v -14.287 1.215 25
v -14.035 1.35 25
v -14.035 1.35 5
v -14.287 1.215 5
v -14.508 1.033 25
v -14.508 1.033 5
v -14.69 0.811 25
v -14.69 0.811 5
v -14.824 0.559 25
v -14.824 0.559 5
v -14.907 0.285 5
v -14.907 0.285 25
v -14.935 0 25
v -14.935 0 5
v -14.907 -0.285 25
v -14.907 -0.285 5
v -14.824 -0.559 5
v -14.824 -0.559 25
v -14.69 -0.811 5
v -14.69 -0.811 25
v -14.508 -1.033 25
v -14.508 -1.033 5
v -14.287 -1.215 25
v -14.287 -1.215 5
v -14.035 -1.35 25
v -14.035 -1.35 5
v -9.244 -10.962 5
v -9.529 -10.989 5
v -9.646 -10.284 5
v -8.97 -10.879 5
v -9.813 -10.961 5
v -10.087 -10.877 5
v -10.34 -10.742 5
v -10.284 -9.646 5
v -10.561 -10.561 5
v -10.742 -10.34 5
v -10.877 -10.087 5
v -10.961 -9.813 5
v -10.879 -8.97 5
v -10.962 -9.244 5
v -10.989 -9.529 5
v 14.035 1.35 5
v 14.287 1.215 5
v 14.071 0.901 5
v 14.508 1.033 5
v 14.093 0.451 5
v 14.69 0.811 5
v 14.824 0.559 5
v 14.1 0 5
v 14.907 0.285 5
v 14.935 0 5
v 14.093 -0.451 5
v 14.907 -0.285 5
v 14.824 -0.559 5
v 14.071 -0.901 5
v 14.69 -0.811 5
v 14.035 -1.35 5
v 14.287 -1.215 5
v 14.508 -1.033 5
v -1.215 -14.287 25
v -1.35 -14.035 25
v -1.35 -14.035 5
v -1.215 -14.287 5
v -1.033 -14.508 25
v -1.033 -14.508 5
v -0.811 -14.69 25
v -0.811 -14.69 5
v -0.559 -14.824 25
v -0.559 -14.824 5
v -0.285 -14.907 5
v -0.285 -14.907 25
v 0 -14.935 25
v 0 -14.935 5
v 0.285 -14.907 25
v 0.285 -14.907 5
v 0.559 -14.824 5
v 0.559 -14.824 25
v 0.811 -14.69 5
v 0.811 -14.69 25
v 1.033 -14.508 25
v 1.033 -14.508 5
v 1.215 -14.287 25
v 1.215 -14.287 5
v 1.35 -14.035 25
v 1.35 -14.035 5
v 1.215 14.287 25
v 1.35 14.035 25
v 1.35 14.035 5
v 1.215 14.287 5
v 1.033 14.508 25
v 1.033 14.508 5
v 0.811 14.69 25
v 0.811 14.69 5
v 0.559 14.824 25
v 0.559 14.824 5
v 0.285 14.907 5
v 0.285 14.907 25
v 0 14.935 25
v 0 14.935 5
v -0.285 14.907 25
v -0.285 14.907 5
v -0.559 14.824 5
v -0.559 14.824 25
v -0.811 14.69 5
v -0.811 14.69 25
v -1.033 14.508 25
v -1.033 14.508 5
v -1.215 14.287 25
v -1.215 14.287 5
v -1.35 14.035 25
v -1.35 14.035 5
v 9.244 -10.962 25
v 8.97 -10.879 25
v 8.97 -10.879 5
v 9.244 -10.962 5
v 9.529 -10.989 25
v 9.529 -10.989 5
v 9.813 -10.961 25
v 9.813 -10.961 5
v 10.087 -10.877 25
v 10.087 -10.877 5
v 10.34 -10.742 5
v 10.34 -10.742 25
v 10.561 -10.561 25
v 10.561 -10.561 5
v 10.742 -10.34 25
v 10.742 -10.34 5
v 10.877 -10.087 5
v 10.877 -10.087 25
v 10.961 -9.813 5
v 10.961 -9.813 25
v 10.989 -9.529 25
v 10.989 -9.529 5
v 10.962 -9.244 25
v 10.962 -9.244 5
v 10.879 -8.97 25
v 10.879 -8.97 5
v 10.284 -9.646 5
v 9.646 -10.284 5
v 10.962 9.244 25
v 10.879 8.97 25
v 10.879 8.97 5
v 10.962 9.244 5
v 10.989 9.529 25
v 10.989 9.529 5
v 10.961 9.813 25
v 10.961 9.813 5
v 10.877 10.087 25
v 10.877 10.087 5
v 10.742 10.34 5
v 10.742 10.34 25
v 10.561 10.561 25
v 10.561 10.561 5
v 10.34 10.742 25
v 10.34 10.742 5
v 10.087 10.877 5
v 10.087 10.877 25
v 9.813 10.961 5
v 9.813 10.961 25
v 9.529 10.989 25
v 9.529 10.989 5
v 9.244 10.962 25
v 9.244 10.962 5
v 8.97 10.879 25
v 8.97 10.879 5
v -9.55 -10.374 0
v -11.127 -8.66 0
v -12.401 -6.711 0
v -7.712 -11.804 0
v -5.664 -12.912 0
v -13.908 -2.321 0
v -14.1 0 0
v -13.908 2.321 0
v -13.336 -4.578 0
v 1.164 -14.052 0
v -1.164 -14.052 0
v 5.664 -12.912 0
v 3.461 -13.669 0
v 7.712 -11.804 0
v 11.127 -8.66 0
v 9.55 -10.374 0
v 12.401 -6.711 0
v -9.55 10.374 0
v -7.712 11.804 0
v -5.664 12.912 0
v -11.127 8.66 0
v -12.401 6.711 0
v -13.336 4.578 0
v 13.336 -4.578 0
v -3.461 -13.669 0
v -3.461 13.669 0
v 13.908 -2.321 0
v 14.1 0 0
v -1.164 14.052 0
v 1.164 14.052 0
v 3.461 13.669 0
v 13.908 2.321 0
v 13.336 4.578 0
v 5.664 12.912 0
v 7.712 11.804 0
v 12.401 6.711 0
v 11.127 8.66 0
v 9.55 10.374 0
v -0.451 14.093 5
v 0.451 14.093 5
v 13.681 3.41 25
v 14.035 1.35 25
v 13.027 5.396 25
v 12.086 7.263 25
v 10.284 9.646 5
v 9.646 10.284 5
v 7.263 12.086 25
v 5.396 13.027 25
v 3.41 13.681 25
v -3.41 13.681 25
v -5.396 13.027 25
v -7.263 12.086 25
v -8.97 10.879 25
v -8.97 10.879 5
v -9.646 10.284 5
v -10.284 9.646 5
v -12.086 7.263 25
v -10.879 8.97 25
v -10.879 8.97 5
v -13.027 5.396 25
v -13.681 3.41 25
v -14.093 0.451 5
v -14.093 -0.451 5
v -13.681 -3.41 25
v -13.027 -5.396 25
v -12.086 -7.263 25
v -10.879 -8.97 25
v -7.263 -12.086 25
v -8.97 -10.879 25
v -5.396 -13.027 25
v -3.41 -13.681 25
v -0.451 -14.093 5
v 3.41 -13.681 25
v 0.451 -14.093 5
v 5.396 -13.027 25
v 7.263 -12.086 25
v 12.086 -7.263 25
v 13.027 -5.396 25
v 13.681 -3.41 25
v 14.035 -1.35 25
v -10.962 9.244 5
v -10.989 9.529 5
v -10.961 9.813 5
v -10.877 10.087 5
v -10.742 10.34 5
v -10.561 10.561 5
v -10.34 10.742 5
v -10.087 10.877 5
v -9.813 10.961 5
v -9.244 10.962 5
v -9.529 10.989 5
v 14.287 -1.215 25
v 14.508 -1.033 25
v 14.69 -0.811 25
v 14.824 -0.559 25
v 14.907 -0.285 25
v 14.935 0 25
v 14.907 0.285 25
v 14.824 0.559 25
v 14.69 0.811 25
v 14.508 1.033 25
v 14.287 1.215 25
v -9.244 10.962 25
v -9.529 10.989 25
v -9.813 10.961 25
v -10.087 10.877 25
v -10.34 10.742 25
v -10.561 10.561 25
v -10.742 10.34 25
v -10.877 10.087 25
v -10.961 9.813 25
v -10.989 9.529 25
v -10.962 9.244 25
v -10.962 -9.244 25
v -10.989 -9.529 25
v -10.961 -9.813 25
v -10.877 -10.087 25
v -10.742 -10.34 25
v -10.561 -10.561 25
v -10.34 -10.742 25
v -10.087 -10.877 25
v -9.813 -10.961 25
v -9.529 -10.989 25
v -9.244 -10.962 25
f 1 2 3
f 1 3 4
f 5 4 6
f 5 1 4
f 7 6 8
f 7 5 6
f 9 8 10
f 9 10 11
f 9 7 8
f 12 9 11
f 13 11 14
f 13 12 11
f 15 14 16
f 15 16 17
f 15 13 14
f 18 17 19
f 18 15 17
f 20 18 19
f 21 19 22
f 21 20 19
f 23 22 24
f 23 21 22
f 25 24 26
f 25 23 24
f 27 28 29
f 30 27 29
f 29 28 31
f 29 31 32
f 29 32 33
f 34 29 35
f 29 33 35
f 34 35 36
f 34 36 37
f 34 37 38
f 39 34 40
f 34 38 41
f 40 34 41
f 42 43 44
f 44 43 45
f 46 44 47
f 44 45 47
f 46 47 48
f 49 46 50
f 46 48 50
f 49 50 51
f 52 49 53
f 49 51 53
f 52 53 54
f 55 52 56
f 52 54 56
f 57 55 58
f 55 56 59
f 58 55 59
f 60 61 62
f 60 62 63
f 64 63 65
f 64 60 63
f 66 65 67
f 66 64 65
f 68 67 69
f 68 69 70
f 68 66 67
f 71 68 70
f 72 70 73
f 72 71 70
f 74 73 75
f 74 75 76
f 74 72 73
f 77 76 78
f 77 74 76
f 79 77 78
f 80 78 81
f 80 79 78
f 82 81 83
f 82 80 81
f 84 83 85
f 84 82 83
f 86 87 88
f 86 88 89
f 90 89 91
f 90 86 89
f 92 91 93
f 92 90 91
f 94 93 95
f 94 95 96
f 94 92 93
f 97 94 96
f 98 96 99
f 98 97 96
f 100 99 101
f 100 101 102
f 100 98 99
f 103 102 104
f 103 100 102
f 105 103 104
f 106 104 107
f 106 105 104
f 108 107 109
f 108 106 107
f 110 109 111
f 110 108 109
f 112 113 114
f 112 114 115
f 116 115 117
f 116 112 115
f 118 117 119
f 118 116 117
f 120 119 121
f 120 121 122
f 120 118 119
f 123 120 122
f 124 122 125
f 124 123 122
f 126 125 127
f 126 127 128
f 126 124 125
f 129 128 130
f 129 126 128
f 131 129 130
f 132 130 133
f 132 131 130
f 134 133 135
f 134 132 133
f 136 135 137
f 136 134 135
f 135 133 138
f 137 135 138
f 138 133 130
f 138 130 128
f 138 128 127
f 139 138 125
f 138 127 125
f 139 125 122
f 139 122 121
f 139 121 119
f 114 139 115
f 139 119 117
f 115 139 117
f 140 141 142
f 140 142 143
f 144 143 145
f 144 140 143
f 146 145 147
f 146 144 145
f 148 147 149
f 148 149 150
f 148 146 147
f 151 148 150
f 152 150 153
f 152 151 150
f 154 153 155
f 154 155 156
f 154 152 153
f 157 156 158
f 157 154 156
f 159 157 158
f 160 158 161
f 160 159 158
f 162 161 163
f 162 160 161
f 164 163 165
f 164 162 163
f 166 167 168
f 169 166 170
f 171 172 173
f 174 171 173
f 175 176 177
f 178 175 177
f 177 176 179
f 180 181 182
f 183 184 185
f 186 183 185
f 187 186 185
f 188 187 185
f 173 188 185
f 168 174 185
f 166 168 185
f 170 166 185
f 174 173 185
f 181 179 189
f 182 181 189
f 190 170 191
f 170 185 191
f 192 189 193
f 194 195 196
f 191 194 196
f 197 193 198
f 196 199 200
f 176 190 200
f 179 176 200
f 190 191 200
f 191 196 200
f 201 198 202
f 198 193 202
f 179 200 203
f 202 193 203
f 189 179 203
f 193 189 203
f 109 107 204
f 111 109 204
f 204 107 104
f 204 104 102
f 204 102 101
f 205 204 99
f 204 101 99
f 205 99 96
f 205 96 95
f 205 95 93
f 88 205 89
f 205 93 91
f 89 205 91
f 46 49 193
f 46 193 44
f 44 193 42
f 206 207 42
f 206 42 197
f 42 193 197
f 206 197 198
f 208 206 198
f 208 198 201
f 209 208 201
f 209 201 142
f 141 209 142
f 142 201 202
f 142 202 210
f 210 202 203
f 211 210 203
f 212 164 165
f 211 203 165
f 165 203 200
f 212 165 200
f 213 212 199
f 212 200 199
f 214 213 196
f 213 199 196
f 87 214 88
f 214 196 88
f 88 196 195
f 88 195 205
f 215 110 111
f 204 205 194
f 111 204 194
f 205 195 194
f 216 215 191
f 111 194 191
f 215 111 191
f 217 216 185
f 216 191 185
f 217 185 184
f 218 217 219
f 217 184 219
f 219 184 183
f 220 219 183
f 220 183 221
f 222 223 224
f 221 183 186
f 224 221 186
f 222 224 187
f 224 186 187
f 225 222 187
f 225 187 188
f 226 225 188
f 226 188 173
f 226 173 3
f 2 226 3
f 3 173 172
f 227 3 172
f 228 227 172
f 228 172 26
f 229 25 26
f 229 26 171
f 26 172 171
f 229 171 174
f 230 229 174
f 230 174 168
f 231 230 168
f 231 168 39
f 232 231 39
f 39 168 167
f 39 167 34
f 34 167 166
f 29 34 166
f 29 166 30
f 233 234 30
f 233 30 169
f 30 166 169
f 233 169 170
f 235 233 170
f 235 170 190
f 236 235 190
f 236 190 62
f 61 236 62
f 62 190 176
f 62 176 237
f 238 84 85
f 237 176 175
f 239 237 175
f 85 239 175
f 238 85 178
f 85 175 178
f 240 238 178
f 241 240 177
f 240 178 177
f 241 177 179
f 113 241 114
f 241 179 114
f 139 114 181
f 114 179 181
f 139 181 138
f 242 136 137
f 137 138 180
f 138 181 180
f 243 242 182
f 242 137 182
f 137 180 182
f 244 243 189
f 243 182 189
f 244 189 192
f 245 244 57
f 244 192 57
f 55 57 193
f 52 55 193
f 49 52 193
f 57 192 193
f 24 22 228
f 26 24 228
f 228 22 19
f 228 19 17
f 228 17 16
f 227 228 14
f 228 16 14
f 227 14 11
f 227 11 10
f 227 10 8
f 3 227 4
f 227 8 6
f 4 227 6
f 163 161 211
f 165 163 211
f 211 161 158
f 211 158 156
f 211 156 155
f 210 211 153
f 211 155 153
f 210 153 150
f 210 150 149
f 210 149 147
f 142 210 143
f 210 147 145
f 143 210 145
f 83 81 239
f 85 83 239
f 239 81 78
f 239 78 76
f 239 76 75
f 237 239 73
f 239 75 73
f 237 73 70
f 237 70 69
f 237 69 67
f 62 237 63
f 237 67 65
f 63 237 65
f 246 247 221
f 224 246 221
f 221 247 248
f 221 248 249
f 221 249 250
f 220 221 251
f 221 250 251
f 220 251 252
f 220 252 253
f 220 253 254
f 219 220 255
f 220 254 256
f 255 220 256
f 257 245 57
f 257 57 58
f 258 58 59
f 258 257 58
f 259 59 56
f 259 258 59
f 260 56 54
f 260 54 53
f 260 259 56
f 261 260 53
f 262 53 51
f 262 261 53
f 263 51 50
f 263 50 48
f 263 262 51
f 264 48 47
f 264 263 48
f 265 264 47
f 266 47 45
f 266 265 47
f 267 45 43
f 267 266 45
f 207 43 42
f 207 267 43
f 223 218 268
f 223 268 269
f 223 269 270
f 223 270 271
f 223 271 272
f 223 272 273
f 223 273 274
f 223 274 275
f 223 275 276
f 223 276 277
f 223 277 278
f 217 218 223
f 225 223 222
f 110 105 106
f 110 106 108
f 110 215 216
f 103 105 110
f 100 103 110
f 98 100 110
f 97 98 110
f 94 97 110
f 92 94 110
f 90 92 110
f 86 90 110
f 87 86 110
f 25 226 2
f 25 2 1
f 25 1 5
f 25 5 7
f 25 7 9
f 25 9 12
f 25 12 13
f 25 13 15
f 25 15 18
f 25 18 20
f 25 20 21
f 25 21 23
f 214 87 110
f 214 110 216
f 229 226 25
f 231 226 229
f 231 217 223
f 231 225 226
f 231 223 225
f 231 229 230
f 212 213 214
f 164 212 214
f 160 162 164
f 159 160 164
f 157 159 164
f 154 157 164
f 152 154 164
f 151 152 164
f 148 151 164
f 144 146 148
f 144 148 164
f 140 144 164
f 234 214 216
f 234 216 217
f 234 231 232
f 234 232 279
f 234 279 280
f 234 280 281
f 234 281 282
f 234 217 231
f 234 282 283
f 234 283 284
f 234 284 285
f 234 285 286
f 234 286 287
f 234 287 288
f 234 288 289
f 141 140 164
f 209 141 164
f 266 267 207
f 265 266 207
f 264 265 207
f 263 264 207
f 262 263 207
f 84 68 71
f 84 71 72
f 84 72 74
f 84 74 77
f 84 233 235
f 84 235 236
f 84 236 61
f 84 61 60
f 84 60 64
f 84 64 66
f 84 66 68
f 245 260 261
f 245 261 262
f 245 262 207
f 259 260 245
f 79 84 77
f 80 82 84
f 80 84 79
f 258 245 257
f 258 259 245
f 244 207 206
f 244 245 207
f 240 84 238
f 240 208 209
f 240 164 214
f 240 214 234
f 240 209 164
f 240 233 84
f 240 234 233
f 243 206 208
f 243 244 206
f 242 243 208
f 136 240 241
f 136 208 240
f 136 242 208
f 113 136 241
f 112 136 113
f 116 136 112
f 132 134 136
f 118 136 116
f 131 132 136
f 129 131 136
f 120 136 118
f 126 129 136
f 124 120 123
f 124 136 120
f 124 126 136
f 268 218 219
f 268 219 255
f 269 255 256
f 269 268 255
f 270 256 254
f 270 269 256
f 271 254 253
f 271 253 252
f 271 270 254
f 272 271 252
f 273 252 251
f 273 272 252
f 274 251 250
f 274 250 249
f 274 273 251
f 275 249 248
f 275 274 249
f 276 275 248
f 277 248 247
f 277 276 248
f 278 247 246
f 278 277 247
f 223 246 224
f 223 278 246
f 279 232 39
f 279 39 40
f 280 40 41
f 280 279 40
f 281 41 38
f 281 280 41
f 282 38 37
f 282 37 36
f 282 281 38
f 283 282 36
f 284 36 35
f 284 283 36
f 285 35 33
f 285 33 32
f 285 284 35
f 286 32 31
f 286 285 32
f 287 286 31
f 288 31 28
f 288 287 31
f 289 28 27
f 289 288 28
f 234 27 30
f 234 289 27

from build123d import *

# Parameters (mm, degrees)
CYLINDER_R         = 14.1
CYLINDER_DEPTH     = 25
PAD_DEPTH          = 20
POLARPATTERN_COUNT = 8


with BuildPart() as part:
    # Cylinder → Cylinder (join)
    with BuildSketch(Plane.XY):
        Circle(CYLINDER_R)
    extrude(amount=CYLINDER_DEPTH)

    # Sketch001 (on Face2 of Cylinder) → Pad (join)
    with BuildSketch(Plane.XY.offset(25)):
        with BuildLine():
            ThreePointArc((1.35, 14.0352235465), (0, 14.9352235465), (-1.35, 14.0352235465))
            ThreePointArc((1.35, 14.0352235465), (0, 14.1), (-1.35, 14.0352235465))
        make_face()
    pad = extrude(amount=-PAD_DEPTH)

    # PolarPattern: Pad ×8 about axis
    polarpattern_axis = Axis((0, 0, 25), (0, 0, 1))
    for i in range(1, POLARPATTERN_COUNT):
        add(pad.rotate(polarpattern_axis, i * 360 / POLARPATTERN_COUNT))


solid = part.part
